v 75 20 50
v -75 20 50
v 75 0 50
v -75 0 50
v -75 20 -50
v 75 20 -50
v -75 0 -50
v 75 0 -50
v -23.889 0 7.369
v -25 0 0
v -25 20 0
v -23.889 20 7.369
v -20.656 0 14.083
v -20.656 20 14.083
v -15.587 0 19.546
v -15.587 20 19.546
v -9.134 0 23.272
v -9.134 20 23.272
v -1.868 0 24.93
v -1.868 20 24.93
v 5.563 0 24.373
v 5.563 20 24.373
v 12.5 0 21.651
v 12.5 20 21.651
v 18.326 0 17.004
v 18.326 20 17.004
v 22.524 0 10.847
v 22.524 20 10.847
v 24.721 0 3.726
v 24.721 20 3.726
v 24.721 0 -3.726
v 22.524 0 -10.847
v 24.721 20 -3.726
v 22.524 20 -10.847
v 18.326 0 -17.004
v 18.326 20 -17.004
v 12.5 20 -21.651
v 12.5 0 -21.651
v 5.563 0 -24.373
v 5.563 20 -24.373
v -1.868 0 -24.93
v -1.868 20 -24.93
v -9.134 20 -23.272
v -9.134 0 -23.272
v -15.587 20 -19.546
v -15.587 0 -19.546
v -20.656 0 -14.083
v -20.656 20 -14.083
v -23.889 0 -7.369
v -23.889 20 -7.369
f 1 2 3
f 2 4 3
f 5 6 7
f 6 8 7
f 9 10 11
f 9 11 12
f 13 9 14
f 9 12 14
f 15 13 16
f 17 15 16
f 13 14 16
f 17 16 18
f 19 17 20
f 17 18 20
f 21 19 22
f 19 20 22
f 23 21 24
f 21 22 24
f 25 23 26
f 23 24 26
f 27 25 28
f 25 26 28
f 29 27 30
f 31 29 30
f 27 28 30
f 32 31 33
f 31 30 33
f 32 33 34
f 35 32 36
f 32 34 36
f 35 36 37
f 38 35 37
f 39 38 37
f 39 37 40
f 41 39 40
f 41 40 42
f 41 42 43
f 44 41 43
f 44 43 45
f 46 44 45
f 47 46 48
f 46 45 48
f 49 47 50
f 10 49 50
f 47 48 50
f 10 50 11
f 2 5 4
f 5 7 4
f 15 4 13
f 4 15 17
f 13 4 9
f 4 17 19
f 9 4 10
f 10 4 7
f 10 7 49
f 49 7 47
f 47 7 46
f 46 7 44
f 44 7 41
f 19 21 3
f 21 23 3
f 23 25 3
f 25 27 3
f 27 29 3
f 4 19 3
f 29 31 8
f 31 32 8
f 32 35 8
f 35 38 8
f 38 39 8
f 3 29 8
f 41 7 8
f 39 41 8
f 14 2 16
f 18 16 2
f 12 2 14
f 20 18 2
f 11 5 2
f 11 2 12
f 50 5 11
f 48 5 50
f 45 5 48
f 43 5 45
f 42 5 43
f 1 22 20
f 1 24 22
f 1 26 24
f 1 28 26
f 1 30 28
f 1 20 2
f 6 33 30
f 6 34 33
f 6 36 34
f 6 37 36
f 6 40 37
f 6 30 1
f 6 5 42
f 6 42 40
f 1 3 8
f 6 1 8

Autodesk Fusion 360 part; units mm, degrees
sketch "Sketch1" plane through (0, 0, 0) normal (0, 1, 0) x (1, 0, 0)
  line L0 (75, 50) -> (-75, 50)
  line L1 (-75, 50) -> (-75, -50)
  line L2 (-75, -50) -> (75, -50)
  line L3 (75, -50) -> (75, 50)
  line L4 (75, 50) -> (-75, -50) construction
  line L5 (-75, 50) -> (75, -50) construction
extrude "Extrude1" add sketch "Sketch1" along normal blind 20
sketch "Sketch2" plane through (0, 20, 0) normal (0, 1, 0) x (-1, 0, 0)
  line L0 (-75, 50) -> (-75, -50)
  line L1 (-75, -50) -> (75, -50)
  line L2 (75, -50) -> (75, 50)
  line L3 (75, 50) -> (-75, 50)
  circle A0 centre (0, 0) radius 25
extrude "Extrude2" cut sketch "Sketch2" against normal blind 20 contours A0
